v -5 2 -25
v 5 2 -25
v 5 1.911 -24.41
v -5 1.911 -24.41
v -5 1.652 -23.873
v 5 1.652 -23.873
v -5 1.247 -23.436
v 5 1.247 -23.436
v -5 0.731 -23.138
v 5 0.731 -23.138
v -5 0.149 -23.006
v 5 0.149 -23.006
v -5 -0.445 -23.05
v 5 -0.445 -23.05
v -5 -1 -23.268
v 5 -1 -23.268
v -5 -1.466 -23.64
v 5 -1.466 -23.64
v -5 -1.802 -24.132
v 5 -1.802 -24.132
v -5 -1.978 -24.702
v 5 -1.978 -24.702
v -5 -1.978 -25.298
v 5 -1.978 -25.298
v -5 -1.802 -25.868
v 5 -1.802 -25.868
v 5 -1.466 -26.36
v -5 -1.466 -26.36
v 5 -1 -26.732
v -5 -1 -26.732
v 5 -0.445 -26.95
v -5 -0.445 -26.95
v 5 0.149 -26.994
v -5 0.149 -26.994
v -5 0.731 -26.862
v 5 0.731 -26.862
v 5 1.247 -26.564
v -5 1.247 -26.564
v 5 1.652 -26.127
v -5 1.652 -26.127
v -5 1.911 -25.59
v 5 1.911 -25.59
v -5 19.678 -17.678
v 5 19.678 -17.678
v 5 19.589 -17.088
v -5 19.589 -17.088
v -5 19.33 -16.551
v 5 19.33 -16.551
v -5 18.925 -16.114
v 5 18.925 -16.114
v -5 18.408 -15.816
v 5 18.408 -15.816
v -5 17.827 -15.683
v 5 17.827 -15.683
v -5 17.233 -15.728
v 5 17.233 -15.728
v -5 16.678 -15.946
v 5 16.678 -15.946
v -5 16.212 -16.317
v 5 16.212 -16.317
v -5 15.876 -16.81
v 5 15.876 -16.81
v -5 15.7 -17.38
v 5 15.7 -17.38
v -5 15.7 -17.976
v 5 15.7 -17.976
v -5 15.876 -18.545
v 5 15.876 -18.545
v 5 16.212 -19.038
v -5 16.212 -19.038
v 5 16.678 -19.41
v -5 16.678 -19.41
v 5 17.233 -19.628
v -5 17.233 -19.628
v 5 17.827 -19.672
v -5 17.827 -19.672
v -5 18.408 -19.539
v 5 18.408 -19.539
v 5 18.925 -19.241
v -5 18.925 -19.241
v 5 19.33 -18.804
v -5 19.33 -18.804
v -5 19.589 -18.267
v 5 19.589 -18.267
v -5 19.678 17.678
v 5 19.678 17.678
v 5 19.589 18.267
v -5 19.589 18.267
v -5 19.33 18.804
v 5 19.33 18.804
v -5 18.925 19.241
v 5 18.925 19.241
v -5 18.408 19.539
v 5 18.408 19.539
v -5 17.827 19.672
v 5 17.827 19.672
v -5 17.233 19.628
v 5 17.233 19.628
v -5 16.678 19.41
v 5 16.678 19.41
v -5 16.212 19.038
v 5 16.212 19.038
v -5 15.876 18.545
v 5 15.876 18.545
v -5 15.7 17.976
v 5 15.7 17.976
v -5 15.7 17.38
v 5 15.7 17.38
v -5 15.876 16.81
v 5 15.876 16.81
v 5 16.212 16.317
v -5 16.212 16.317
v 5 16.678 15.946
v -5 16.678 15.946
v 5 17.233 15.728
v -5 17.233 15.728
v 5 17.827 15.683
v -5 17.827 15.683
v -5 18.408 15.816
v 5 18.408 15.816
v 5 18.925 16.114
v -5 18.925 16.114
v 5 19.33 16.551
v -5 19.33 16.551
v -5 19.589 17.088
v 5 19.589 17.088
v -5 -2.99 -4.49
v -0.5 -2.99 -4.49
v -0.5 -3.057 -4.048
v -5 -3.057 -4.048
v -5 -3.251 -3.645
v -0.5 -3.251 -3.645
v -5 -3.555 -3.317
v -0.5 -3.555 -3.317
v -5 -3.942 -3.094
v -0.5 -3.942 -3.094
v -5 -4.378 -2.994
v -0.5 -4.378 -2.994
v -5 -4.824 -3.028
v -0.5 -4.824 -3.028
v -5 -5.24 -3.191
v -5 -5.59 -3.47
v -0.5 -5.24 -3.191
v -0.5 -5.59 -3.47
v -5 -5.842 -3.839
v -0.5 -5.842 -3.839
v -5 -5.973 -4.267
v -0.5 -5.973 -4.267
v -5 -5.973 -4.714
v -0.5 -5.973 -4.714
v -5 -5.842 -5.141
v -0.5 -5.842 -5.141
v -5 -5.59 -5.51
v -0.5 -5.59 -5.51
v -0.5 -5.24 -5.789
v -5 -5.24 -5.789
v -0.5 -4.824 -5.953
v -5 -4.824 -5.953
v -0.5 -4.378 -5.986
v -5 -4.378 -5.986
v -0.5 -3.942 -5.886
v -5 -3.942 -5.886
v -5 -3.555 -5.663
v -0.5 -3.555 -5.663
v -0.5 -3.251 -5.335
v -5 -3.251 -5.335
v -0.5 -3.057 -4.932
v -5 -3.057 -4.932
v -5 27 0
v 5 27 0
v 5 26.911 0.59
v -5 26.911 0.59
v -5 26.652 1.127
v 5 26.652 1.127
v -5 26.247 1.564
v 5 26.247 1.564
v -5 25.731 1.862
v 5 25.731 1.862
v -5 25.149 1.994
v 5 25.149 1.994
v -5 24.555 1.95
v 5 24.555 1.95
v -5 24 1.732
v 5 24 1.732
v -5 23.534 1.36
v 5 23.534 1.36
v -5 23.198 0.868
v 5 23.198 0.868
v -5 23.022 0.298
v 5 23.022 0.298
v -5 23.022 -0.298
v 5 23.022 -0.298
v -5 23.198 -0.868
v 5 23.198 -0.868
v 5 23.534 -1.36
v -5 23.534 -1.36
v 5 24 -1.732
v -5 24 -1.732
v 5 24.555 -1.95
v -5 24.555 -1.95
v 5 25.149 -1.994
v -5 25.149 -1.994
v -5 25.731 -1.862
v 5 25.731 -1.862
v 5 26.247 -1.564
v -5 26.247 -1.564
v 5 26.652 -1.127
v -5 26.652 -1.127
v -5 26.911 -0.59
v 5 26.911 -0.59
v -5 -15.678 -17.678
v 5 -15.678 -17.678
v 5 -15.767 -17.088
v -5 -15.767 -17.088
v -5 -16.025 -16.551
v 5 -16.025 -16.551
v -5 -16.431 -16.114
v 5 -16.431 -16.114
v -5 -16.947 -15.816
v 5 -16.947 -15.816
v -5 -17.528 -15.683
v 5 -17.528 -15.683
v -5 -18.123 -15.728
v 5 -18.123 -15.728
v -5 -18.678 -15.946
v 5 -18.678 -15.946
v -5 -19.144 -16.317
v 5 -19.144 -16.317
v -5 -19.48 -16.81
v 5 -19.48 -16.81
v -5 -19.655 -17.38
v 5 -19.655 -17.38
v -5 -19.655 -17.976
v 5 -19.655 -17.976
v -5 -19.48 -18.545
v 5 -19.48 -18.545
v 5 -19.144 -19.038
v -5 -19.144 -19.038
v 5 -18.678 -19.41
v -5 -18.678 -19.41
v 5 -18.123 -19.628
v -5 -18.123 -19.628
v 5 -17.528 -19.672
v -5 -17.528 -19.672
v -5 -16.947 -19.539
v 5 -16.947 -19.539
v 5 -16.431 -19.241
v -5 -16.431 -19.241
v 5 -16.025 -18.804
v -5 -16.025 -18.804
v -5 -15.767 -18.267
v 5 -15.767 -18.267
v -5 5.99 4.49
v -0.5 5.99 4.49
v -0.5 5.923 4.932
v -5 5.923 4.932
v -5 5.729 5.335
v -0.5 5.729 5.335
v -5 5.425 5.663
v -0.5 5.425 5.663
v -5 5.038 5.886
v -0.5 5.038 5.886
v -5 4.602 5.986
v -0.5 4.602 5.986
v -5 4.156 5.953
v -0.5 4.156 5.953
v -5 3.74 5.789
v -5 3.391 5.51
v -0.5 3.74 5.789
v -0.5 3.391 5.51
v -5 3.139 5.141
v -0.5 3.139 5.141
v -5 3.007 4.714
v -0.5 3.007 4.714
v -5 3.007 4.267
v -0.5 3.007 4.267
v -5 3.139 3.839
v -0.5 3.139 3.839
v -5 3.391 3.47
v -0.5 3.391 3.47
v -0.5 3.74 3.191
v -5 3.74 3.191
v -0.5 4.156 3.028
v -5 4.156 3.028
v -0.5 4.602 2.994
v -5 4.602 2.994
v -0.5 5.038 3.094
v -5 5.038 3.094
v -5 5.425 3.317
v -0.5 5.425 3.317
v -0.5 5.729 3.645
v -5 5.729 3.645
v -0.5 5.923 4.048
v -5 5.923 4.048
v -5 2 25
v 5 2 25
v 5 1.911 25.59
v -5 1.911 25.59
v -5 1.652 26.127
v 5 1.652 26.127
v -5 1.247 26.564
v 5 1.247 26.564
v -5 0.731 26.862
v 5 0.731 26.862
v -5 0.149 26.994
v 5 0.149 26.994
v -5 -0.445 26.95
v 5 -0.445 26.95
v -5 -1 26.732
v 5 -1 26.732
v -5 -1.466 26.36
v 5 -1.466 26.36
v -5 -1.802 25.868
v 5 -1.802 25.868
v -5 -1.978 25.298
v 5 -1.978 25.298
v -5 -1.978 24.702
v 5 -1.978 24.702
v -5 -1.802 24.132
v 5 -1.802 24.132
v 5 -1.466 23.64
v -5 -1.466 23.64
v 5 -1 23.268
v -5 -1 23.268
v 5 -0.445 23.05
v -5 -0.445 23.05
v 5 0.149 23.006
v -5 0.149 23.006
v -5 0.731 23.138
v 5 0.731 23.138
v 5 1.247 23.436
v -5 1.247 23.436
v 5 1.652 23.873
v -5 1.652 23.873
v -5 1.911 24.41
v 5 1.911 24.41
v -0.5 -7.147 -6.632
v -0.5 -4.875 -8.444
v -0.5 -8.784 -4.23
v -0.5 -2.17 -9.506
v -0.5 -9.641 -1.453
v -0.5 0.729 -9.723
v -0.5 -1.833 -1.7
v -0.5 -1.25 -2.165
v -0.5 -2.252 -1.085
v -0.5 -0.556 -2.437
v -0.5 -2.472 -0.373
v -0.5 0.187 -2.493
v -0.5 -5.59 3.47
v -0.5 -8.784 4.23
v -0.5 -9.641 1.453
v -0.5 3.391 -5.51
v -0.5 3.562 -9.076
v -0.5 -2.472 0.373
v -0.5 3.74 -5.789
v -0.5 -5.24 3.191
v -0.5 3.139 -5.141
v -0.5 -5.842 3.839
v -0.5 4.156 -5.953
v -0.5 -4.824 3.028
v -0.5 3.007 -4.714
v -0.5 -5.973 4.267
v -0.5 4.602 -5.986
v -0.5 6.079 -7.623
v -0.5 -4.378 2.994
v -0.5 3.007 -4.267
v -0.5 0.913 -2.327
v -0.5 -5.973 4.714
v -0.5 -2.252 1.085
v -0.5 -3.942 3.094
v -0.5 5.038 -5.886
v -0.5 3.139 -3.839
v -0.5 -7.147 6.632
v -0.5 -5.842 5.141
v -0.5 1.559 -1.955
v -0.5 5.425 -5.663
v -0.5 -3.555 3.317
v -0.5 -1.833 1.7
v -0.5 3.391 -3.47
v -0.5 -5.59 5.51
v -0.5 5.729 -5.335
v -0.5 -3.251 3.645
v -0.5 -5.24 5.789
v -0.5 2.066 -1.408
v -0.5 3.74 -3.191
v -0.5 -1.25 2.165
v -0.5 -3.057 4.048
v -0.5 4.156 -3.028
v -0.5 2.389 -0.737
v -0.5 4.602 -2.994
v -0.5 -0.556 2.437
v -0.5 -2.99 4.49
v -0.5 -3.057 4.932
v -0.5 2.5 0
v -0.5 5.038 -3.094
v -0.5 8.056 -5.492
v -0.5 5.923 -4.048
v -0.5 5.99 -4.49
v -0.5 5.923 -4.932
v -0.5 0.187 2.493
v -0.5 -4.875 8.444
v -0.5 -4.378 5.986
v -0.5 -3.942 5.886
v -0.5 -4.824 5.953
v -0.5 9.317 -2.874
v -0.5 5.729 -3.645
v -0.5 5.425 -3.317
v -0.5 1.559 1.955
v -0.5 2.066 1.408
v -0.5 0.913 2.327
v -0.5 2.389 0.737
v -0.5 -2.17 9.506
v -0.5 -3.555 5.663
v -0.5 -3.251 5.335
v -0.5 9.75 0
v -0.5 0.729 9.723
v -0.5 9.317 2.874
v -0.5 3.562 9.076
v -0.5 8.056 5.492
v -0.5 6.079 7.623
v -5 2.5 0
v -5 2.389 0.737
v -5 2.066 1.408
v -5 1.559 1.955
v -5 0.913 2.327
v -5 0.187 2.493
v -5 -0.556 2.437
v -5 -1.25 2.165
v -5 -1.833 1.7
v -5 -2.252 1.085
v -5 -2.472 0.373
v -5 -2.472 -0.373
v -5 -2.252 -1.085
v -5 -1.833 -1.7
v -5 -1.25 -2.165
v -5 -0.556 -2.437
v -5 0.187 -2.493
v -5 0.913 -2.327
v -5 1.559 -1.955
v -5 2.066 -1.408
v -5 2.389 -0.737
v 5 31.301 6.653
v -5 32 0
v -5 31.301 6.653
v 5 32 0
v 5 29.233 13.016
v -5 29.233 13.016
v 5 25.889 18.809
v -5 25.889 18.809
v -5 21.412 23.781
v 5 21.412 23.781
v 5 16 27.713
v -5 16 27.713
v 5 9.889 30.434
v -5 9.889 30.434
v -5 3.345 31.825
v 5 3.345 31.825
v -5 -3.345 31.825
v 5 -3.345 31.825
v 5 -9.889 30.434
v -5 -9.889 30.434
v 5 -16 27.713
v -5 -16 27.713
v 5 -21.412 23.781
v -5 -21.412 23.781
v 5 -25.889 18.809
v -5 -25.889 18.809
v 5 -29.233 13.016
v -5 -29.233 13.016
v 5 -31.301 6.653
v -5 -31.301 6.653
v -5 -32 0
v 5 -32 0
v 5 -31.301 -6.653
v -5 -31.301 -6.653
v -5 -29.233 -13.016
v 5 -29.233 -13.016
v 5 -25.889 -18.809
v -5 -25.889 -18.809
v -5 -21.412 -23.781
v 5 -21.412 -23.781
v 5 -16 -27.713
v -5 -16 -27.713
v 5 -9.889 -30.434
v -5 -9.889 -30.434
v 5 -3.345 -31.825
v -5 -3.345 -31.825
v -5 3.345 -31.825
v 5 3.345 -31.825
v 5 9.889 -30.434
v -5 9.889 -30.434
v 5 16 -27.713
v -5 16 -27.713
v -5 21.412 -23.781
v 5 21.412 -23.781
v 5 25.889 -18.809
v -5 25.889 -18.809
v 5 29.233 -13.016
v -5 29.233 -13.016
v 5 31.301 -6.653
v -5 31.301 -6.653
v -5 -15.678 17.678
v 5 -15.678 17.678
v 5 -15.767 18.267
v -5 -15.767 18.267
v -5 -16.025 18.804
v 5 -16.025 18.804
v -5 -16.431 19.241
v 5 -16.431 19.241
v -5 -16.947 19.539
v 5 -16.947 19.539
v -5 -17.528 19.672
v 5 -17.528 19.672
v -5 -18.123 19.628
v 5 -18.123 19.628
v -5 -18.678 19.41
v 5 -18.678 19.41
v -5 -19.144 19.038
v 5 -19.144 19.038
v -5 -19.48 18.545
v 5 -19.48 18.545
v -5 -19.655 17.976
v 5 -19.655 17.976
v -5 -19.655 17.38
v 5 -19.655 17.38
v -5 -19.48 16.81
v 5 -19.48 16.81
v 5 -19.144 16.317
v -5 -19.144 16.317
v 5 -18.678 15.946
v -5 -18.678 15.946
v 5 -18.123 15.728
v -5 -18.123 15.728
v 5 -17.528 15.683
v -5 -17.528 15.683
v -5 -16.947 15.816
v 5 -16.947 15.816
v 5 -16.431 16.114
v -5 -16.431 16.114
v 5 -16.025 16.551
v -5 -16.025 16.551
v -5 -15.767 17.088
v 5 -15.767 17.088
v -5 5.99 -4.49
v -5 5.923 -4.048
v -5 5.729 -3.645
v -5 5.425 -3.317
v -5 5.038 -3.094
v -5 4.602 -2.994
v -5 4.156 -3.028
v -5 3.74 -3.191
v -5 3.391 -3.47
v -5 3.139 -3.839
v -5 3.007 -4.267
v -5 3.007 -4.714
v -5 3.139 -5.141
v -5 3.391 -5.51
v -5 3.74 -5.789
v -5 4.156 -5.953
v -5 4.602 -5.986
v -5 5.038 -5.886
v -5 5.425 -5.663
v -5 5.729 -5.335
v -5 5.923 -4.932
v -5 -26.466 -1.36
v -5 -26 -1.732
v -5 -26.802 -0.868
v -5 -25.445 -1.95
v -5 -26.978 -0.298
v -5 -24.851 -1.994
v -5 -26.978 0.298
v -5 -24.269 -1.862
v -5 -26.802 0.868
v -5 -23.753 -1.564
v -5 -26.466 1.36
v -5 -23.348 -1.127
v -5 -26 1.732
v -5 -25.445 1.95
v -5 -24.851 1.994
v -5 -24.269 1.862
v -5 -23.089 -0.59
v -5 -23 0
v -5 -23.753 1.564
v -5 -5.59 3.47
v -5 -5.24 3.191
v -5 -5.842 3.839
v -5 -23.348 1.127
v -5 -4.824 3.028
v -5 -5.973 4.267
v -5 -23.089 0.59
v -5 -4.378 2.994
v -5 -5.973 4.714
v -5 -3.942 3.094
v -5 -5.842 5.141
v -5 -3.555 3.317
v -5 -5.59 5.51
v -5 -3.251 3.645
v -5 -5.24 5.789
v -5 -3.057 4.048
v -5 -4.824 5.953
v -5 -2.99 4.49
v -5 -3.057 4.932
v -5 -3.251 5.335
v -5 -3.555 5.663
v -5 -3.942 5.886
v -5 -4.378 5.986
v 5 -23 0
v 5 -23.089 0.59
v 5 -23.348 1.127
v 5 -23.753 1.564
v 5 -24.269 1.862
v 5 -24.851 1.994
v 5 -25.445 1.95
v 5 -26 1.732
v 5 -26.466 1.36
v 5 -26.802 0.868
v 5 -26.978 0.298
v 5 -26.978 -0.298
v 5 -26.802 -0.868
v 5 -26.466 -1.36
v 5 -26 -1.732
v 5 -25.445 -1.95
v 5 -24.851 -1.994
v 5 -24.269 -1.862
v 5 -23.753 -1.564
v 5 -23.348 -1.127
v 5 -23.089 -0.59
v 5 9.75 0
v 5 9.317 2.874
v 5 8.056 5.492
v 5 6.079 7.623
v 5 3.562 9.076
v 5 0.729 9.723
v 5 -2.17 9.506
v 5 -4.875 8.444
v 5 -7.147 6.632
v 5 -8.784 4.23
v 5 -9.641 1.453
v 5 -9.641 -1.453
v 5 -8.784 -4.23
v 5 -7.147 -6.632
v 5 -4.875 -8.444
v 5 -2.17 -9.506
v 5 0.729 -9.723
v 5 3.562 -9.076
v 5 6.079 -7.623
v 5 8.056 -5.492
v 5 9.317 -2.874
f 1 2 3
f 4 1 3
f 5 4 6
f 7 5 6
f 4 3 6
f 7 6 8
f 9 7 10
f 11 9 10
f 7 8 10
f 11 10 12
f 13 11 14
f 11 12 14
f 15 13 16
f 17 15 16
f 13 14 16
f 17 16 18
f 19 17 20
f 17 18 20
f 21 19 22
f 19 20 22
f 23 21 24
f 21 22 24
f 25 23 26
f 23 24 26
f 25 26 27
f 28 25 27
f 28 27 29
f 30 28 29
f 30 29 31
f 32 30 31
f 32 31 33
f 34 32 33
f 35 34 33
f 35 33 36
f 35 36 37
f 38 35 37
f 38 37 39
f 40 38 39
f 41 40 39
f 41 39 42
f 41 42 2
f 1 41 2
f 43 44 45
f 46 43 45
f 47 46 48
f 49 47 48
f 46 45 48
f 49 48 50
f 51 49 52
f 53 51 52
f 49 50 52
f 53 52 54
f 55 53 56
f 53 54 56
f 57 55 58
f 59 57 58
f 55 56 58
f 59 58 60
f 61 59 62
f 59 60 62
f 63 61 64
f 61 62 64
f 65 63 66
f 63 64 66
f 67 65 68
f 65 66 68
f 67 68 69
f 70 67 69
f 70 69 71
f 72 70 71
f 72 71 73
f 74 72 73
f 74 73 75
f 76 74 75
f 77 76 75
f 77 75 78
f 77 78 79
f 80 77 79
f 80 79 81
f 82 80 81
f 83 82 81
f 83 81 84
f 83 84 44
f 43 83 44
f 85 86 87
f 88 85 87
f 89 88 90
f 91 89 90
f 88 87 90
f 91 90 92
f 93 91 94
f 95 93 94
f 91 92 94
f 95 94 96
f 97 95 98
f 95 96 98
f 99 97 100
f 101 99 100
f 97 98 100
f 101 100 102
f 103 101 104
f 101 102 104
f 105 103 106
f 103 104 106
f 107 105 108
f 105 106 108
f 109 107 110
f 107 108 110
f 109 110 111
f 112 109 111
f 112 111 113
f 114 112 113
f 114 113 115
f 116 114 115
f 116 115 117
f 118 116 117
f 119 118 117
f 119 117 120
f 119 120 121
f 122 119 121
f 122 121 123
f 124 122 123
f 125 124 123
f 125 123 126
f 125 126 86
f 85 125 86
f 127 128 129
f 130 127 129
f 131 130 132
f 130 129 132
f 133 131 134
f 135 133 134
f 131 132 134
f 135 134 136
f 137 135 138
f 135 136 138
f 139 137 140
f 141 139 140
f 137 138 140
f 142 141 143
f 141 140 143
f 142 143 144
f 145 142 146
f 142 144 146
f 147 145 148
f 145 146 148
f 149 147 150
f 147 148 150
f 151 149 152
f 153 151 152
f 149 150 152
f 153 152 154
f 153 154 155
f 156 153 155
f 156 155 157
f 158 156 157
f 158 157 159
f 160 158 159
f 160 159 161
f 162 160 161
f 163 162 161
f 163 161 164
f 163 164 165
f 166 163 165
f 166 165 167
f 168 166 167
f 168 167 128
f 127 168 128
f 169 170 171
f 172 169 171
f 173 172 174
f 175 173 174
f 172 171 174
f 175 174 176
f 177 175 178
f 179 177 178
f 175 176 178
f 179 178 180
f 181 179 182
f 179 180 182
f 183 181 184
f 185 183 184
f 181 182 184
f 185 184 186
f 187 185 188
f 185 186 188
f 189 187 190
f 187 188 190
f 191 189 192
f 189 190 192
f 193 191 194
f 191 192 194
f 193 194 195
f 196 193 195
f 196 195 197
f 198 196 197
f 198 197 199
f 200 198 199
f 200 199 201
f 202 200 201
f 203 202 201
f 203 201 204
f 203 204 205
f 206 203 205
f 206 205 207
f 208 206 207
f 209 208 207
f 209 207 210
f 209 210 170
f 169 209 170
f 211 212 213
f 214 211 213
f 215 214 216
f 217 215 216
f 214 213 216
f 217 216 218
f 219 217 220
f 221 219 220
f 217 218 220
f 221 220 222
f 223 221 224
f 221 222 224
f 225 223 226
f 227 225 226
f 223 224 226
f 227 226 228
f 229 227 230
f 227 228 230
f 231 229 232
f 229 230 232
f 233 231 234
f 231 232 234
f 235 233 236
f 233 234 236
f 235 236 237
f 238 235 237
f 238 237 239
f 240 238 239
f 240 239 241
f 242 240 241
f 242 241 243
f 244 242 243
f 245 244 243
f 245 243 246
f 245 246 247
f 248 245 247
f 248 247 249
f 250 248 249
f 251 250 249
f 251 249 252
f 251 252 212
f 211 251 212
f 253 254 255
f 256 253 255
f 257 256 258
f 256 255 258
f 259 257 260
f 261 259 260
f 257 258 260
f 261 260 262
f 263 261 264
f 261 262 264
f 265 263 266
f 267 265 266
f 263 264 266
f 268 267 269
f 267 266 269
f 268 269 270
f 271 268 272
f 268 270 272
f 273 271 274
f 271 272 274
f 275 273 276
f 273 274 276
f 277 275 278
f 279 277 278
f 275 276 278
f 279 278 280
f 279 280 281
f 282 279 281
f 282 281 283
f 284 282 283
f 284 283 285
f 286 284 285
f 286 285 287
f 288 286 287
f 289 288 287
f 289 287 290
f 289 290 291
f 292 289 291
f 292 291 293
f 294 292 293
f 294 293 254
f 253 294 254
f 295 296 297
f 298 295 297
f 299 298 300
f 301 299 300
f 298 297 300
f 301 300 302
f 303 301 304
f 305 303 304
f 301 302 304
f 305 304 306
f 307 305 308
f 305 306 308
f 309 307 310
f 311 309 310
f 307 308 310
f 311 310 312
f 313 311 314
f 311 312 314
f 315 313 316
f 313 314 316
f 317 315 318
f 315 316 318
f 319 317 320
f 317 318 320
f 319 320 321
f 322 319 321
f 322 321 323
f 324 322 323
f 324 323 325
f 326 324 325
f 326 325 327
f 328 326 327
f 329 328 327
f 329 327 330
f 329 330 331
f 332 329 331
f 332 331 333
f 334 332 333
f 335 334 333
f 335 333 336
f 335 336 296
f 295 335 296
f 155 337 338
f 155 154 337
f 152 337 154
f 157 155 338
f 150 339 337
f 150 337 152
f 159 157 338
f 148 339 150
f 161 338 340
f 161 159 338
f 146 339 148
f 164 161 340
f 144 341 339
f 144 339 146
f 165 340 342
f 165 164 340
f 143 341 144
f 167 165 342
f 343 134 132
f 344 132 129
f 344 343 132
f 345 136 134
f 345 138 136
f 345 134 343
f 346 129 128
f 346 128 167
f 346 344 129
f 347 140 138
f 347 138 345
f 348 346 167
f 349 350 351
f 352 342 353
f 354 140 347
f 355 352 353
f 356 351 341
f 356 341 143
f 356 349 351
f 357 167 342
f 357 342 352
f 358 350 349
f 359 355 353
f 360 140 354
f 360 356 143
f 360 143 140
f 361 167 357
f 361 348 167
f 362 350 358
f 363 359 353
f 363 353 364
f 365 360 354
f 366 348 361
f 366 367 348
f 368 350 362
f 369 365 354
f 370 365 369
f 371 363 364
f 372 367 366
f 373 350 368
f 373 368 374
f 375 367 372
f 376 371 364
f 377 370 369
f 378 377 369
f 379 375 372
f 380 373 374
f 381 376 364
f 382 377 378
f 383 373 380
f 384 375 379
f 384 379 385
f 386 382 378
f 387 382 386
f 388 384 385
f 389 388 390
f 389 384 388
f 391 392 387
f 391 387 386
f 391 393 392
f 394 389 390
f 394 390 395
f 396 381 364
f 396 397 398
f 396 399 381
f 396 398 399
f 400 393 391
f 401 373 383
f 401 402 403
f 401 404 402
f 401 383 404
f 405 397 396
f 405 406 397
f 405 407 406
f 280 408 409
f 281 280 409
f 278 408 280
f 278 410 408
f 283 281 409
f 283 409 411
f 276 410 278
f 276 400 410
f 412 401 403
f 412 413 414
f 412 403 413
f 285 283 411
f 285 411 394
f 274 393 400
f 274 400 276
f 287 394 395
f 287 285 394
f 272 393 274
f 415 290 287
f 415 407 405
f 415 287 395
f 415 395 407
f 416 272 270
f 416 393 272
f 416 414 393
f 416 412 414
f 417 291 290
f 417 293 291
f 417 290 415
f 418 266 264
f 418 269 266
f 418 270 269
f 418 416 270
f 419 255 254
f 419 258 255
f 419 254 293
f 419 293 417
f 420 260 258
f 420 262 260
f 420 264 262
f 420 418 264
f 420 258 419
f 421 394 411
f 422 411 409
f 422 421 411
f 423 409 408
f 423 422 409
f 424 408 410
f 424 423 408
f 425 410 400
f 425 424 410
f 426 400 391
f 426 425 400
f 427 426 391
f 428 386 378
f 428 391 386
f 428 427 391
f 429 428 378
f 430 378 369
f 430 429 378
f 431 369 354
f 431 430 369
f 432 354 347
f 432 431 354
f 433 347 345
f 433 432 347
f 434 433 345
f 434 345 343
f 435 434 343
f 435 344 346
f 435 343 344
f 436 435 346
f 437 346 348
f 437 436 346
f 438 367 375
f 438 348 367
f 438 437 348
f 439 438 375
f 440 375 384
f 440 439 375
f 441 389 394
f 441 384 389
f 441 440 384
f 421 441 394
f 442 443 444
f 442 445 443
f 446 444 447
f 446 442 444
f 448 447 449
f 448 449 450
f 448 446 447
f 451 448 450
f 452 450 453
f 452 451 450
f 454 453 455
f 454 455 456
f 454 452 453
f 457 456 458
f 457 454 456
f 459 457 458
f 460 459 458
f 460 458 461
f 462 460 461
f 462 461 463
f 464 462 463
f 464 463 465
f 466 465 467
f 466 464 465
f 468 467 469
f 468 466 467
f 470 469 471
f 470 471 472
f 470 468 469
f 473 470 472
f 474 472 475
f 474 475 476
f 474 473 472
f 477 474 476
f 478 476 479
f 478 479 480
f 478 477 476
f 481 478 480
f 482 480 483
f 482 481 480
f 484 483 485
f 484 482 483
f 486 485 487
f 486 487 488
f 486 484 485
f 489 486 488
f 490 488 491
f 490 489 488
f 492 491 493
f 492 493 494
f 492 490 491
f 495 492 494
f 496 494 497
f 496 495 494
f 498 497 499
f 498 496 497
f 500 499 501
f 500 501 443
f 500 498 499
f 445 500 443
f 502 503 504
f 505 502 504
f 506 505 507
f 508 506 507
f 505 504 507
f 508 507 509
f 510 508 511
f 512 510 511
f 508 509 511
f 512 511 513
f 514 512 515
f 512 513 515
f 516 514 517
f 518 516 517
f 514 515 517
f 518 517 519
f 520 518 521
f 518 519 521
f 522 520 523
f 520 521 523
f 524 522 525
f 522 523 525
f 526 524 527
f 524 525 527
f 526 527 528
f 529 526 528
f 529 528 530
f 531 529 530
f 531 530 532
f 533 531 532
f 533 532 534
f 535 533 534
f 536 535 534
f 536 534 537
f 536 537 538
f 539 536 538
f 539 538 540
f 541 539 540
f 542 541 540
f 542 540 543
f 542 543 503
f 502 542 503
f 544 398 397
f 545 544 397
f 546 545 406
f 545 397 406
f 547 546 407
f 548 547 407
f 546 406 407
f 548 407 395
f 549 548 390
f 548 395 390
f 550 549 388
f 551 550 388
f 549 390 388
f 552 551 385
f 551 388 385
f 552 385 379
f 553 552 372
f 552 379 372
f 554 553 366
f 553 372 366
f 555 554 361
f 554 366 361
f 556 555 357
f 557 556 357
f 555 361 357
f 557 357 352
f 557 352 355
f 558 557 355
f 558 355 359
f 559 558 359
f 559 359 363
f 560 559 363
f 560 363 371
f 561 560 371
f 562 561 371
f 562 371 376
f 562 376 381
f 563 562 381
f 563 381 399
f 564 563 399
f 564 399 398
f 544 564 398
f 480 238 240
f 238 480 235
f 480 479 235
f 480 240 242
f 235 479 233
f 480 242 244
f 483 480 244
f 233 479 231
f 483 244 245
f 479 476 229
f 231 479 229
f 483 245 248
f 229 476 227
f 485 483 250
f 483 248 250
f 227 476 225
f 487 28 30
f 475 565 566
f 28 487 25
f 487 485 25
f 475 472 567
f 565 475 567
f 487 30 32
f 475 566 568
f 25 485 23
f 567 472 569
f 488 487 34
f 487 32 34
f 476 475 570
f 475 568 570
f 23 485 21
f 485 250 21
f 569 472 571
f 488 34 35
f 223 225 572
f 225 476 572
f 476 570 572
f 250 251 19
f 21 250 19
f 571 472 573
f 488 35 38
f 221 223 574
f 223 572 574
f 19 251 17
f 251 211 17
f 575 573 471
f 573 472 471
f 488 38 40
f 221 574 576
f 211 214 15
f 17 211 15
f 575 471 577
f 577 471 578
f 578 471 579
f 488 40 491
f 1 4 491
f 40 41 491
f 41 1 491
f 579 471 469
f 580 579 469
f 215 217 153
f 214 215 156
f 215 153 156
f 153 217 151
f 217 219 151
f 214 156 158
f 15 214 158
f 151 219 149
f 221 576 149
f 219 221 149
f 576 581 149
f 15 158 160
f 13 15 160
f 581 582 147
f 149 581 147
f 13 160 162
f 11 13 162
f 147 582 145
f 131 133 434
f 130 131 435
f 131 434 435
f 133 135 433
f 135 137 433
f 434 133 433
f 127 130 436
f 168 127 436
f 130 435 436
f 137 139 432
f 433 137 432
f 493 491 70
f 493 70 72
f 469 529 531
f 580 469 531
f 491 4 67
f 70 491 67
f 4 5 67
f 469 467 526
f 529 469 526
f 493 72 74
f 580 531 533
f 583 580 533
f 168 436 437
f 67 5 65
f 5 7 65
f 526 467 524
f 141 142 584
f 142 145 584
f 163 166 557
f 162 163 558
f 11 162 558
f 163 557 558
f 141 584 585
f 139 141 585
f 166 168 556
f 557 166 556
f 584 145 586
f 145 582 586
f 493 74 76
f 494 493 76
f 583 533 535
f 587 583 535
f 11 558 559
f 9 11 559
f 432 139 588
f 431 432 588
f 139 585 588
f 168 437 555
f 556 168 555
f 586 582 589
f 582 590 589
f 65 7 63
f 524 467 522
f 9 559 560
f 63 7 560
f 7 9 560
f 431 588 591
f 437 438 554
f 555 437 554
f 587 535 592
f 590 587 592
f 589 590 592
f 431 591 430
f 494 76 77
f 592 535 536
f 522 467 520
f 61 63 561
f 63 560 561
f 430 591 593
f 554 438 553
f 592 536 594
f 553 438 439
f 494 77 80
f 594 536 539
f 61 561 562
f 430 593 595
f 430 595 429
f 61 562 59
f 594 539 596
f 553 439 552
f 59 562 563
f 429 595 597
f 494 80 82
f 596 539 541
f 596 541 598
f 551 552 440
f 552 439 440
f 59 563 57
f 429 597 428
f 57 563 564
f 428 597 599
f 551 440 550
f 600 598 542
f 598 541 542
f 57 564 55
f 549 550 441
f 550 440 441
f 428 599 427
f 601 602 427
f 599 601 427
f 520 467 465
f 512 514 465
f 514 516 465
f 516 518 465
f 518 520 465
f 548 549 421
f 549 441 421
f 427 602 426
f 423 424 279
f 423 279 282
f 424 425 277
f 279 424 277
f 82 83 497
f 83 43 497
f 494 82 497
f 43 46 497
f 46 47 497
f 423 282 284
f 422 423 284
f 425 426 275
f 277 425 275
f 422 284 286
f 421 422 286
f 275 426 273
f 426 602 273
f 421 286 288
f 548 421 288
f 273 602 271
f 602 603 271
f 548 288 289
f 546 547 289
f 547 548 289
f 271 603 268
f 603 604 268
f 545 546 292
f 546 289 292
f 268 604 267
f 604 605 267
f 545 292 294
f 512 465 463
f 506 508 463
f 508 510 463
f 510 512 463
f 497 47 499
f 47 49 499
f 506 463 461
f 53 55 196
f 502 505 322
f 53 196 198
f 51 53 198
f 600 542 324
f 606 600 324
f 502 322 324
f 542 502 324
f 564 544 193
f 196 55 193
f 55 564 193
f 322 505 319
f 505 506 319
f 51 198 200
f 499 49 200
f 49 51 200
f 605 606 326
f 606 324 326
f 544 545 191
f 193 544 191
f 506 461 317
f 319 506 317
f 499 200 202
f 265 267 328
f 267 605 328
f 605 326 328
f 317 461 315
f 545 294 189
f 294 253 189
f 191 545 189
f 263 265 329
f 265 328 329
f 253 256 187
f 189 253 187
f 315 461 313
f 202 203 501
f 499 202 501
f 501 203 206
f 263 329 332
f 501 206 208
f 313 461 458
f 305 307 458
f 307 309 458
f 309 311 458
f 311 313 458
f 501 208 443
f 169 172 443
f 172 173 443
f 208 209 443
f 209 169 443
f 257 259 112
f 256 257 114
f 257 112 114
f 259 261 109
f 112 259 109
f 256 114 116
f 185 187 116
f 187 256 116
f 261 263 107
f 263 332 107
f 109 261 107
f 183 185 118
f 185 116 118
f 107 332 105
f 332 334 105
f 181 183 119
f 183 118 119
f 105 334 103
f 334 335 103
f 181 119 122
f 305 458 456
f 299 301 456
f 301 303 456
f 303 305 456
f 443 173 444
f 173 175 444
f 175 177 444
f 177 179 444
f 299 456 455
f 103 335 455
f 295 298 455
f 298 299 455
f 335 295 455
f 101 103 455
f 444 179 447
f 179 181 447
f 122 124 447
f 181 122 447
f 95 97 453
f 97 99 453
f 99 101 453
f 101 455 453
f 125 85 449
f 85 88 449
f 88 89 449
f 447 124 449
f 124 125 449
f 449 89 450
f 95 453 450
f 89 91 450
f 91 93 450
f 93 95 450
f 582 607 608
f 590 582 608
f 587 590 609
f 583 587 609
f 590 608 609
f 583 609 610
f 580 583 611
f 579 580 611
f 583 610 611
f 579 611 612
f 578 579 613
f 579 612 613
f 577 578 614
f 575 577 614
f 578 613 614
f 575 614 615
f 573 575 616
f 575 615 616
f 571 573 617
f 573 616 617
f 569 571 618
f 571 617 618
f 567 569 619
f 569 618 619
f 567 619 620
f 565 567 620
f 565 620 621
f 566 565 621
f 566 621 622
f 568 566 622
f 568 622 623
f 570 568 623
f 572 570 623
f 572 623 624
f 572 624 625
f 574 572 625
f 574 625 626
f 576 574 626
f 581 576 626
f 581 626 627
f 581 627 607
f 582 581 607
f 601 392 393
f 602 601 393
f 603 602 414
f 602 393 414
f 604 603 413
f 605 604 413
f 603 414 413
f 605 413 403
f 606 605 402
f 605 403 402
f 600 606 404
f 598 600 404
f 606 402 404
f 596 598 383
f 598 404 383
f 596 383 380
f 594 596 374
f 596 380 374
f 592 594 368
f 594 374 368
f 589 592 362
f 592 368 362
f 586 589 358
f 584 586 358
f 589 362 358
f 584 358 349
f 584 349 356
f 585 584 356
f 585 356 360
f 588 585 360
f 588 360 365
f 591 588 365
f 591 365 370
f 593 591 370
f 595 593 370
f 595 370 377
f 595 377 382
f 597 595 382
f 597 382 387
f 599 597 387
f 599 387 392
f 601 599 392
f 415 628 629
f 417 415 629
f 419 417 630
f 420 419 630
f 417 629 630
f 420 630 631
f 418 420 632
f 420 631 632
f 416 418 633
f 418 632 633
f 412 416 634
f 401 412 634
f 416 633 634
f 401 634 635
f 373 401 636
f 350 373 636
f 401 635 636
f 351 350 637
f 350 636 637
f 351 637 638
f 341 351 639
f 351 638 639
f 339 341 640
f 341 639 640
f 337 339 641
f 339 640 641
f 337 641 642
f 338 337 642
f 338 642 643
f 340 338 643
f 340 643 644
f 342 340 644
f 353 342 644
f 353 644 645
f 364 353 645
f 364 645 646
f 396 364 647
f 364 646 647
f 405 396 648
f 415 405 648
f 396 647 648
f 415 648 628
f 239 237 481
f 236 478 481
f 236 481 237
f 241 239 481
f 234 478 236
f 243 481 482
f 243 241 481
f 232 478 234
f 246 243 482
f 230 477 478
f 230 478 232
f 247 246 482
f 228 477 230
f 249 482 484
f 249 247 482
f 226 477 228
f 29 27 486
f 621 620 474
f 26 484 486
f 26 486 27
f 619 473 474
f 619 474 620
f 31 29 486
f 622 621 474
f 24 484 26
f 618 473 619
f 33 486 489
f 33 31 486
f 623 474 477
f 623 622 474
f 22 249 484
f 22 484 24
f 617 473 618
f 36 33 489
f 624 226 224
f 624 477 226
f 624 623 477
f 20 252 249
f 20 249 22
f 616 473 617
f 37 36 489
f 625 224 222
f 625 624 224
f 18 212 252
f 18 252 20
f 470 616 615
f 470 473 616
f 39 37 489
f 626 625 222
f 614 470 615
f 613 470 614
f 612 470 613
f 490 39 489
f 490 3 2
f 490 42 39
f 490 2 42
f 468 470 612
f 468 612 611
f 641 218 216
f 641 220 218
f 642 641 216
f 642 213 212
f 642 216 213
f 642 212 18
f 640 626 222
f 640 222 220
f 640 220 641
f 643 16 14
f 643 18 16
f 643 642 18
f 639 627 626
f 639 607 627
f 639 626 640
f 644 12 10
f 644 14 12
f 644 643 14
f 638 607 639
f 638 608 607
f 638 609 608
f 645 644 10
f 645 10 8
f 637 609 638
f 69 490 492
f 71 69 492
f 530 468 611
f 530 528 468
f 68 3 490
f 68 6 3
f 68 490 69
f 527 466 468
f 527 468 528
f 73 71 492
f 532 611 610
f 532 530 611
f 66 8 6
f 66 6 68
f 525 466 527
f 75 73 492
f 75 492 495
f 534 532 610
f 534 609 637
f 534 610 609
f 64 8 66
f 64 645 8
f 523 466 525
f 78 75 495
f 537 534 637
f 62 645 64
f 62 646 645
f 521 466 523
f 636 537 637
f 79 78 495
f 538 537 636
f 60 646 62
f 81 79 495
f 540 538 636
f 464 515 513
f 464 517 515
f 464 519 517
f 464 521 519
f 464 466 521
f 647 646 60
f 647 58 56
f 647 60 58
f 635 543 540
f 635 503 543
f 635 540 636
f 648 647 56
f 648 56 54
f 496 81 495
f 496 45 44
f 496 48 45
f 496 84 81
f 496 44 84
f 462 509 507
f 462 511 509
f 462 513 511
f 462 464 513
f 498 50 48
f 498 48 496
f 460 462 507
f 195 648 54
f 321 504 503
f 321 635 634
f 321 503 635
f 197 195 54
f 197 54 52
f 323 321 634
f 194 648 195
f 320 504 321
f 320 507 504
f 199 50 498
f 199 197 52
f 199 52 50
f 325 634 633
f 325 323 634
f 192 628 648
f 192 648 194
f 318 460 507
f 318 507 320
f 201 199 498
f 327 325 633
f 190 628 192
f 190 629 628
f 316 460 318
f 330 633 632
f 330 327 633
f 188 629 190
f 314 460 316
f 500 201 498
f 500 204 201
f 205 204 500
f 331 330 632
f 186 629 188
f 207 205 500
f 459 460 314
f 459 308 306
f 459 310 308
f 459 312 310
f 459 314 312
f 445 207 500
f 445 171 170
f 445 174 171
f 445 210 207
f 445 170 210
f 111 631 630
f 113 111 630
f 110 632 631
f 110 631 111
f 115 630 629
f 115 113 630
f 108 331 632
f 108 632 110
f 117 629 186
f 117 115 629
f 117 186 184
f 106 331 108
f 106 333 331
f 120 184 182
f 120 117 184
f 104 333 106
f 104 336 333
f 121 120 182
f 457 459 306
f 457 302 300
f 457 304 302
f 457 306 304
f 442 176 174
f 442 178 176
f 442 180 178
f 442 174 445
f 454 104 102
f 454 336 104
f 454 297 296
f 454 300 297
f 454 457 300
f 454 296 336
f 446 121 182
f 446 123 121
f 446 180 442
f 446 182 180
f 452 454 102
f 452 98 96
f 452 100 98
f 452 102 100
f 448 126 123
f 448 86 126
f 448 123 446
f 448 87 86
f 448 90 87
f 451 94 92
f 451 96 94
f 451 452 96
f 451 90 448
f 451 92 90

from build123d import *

# Parameters (mm, degrees)
F0_R     = 32
F0_R_2   = 2.5
F1_DEPTH = 5
F2_R     = 9.75
F3_DEPTH = 5.5
F4_R     = 1.5
F5_DEPTH = 4.501
F6_R     = 2
F7_DEPTH = 10.001


with BuildPart() as f1:
    # F0 (on Right) → F1 (new body, symmetric)
    with BuildSketch(Plane.YZ):
        Circle(F0_R)
        Circle(F0_R_2, mode=Mode.SUBTRACT)
    extrude(amount=F1_DEPTH, both=True)

    # F2 (on face) → F3 (cut)
    with BuildSketch(Plane.YZ.offset(5)):
        Circle(F2_R)
    extrude(amount=-F3_DEPTH, mode=Mode.SUBTRACT)

    # F4 (on face) → F5 (cut, through all)
    with BuildSketch(Plane.YZ.offset(-0.5)):
        with Locations((-4.490128, 4.490128)):
            Circle(F4_R)
        with Locations((-4.490128, -4.490128)):
            Circle(F4_R)
        with Locations((4.490128, -4.490128)):
            Circle(F4_R)
        with Locations((4.490128, 4.490128)):
            Circle(F4_R)
    extrude(amount=-F5_DEPTH, mode=Mode.SUBTRACT)

    # F6 (on face) → F7 (cut, through all)
    with BuildSketch(Plane.YZ.offset(5)):
        with Locations((0, 25)):
            Circle(F6_R)
        with Locations((-17.67767, 17.67767)):
            Circle(F6_R)
        with Locations((-25, 0)):
            Circle(F6_R)
        with Locations((-17.67767, -17.67767)):
            Circle(F6_R)
        with Locations((0, -25)):
            Circle(F6_R)
        with Locations((17.67767, -17.67767)):
            Circle(F6_R)
        with Locations((25, 0)):
            Circle(F6_R)
        with Locations((17.67767, 17.67767)):
            Circle(F6_R)
    extrude(amount=-F7_DEPTH, mode=Mode.SUBTRACT)


solid = f1.part
